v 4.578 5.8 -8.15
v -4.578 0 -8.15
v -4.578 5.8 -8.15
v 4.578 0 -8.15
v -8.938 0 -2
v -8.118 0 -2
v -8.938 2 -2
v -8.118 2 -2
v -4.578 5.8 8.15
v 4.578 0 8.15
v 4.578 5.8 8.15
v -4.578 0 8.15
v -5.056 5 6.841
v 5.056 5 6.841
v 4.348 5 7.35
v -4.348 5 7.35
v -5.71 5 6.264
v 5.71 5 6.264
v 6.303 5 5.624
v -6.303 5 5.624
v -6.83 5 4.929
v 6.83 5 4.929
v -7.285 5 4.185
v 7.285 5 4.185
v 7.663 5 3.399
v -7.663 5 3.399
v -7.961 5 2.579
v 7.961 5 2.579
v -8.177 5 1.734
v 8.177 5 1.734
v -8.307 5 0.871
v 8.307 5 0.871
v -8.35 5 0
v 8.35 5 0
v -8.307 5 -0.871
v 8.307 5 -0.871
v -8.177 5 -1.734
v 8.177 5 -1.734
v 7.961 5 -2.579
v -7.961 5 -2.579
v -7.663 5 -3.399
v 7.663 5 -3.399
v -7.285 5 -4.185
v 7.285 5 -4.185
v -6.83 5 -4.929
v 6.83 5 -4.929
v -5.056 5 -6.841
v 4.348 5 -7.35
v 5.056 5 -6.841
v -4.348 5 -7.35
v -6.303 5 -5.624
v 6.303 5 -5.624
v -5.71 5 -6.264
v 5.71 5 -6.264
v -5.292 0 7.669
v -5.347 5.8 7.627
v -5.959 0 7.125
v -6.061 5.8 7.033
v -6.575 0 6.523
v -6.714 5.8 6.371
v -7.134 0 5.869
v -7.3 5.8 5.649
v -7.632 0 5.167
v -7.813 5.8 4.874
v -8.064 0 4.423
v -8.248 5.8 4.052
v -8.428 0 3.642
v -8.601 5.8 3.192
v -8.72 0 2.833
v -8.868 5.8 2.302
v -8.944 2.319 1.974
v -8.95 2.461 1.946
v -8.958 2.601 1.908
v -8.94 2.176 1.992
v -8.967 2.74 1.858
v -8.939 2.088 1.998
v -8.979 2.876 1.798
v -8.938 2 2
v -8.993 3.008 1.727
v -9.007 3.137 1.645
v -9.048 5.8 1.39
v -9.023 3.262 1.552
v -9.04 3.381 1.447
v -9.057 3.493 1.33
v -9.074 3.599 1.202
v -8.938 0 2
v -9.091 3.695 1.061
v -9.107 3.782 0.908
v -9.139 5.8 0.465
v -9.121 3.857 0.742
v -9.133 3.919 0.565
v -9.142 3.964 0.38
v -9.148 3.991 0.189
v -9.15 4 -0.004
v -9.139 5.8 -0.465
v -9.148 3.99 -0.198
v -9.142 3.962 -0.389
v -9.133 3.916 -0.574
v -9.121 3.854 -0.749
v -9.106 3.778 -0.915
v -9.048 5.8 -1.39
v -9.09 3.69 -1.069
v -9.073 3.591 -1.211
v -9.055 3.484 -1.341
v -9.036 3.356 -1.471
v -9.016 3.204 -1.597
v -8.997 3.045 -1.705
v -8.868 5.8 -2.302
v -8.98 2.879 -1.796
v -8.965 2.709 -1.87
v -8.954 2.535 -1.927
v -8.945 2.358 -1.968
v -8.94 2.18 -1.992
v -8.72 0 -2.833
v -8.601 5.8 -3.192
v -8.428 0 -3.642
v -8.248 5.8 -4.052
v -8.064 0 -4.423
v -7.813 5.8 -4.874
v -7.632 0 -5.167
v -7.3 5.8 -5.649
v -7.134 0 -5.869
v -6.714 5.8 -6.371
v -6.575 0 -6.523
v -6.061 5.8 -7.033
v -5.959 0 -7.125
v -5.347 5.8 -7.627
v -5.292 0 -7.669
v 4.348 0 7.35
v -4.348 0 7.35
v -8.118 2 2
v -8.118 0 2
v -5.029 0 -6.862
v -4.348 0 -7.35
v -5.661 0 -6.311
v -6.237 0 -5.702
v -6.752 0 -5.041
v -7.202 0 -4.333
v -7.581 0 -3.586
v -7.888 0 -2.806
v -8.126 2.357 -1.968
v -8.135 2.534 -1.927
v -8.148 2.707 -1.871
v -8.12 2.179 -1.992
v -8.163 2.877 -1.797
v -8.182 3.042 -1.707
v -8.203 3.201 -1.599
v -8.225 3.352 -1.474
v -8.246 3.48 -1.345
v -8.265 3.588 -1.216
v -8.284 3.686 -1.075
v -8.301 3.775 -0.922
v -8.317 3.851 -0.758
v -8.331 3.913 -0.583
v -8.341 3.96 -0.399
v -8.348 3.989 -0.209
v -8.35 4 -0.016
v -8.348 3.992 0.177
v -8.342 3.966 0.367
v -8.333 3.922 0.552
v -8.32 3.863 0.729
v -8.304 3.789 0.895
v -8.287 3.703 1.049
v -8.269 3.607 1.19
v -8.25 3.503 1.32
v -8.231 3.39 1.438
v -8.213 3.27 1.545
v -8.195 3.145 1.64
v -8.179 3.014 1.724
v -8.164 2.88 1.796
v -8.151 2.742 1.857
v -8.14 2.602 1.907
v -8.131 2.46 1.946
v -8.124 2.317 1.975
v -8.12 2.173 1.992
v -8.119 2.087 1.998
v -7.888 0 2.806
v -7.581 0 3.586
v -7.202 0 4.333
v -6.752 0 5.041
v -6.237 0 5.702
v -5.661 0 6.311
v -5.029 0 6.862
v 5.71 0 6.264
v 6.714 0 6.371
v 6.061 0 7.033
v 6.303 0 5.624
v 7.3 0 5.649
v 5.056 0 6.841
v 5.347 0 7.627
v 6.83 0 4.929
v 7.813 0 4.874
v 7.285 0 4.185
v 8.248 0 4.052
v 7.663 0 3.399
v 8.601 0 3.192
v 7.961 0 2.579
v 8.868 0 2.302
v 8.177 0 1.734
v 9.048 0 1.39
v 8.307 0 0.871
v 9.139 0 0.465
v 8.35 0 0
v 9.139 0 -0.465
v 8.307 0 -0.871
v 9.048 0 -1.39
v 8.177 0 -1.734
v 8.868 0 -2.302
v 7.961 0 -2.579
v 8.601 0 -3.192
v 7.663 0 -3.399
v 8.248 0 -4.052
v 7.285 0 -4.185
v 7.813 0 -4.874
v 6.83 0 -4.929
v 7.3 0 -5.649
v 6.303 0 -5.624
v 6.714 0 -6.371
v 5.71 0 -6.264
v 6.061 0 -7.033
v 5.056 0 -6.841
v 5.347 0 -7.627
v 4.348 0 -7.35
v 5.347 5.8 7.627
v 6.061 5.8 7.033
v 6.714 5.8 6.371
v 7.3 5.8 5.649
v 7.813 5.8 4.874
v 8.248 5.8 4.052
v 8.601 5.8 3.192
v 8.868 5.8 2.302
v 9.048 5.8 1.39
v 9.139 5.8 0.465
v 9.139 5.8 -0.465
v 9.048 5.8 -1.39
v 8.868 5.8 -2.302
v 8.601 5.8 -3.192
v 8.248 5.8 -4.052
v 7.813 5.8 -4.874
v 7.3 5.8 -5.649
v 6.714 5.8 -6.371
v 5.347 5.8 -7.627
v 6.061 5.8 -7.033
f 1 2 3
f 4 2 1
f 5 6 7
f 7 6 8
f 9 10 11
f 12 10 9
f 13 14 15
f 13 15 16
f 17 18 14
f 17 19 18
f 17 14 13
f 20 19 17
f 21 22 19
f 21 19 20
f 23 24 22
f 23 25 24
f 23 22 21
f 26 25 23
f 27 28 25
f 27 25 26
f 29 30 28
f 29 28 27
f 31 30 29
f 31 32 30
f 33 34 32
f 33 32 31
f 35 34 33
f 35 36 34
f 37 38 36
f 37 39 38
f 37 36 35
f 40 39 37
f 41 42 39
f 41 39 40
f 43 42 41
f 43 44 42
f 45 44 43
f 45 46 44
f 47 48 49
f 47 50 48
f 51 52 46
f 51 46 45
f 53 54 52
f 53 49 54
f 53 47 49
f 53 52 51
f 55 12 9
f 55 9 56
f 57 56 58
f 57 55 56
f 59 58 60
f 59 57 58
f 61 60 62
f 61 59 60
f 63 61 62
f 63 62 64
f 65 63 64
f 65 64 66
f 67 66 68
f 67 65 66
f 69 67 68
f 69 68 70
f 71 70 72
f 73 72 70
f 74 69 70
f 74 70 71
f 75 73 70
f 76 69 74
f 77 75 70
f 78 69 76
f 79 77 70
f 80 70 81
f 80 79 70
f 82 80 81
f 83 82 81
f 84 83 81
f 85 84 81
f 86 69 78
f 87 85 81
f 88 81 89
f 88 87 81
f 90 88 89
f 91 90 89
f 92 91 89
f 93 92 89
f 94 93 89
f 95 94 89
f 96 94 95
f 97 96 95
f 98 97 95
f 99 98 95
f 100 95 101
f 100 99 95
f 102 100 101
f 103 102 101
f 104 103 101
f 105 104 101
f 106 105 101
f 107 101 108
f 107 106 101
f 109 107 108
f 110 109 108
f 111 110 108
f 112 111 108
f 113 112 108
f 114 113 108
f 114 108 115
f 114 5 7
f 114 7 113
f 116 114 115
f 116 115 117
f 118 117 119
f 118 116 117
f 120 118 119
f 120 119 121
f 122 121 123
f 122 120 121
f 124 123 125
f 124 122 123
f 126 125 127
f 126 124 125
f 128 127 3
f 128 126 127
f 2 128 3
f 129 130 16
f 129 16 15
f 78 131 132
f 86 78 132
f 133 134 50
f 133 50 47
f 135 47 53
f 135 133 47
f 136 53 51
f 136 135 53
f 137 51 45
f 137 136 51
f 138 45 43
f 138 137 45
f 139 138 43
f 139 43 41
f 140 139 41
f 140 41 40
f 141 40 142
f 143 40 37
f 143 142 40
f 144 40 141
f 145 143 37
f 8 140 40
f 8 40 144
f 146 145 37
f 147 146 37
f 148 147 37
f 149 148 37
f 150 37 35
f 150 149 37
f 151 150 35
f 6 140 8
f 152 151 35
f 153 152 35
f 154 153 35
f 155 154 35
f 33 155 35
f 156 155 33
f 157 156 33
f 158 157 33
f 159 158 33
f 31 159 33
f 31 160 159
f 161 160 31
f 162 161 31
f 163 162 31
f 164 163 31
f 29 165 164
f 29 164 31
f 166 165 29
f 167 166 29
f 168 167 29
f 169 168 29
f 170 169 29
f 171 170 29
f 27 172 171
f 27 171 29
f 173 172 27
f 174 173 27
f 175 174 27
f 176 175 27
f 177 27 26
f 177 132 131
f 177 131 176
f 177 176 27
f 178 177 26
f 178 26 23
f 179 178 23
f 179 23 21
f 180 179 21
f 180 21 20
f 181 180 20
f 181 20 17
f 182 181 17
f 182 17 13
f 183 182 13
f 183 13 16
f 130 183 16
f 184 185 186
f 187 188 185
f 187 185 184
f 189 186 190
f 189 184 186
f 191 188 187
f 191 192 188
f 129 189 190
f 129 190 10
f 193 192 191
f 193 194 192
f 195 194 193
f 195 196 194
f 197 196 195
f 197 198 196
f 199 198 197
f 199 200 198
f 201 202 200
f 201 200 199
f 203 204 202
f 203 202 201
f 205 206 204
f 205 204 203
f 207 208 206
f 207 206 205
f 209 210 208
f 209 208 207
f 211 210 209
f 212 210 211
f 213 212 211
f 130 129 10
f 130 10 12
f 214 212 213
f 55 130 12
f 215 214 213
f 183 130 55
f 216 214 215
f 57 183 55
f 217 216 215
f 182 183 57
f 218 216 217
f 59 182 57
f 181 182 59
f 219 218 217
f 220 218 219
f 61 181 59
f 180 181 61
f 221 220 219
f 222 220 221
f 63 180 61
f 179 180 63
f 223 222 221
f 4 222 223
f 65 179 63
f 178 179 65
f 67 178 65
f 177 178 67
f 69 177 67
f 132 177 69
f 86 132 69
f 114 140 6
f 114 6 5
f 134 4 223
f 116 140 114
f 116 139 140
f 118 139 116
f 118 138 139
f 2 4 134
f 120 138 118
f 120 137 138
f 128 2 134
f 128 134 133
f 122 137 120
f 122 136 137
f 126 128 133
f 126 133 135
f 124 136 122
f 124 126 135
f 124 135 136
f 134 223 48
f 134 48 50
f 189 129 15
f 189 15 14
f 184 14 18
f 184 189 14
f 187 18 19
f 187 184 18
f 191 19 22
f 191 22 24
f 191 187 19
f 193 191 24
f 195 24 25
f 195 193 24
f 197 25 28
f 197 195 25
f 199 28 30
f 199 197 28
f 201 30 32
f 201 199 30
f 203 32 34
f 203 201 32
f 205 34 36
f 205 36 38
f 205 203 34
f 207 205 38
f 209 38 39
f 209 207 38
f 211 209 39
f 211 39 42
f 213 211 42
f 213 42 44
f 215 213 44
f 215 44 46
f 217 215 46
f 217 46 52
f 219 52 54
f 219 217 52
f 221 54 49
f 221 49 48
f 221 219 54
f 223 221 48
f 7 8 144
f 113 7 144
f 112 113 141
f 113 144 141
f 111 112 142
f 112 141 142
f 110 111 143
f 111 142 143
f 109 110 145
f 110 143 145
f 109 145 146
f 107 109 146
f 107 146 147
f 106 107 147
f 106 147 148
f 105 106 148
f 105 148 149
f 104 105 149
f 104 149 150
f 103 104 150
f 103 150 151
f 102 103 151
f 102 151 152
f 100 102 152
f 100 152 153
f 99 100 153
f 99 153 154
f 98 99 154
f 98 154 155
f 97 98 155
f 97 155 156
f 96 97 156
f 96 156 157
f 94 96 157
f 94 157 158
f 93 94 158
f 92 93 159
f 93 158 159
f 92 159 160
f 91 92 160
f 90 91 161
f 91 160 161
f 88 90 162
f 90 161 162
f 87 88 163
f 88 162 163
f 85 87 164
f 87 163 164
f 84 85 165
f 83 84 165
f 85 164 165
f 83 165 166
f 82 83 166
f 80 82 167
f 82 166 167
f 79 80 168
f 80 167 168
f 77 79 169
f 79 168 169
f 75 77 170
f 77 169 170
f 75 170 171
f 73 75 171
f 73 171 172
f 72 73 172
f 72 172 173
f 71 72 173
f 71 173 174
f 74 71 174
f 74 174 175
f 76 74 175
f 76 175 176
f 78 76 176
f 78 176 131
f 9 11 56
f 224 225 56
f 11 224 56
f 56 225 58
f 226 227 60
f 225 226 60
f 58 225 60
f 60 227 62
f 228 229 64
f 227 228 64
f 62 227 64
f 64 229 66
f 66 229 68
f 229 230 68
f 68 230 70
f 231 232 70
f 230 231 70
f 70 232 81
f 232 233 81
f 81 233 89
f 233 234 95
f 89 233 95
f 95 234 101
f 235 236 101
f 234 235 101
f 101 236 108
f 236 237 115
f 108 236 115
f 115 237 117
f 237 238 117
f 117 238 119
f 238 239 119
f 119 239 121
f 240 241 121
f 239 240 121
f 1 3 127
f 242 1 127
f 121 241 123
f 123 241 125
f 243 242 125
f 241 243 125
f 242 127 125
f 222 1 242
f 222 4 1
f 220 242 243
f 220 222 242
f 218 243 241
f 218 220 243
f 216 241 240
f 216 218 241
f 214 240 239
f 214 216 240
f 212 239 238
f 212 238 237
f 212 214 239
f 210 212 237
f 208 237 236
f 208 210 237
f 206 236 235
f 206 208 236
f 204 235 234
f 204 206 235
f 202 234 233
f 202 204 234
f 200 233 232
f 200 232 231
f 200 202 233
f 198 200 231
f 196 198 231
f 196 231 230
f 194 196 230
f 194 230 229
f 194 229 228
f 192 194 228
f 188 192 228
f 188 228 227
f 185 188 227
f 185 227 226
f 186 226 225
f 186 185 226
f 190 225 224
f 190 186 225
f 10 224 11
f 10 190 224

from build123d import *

# Parameters (mm, degrees)
BOSS_EXTRUDE1_DEPTH = 5
BOSS_EXTRUDE2_DEPTH = 0.8
CUT_EXTRUDE1_DEPTH  = 14.556732645


with BuildPart() as part:
    # Sketch1 → Boss-Extrude1 (new body)
    with BuildSketch(Plane(origin=(0, 0, 0), x_dir=(1, 0, 0), z_dir=(0, 1, 0))):
        with BuildLine():
            ThreePointArc((4.577951386, 8.15), (9.15, 0), (4.577951386, -8.15))
            Line((4.577951386, -8.15), (-4.577951386, -8.15))
            ThreePointArc((-4.577951386, -8.15), (-9.15, 0), (-4.577951386, 8.15))
            Line((-4.577951386, 8.15), (4.577951386, 8.15))
        make_face()
        with BuildLine():
            Line((4.347630988, 7.35), (-4.347630988, 7.35))
            ThreePointArc((-4.347630988, 7.35), (-8.35, 0), (-4.347630988, -7.35))
            Line((-4.347630988, -7.35), (4.347630988, -7.35))
            ThreePointArc((4.347630988, -7.35), (8.35, 0), (4.347630988, 7.35))
        make_face(mode=Mode.SUBTRACT)
    extrude(amount=BOSS_EXTRUDE1_DEPTH)

    # Sketch2 → Boss-Extrude2 (add)
    with BuildSketch(Plane(origin=(0, 5, 0), x_dir=(1, 0, 0), z_dir=(0, 1, 0))):
        with BuildLine():
            Line((4.577951386, -8.15), (-4.577951386, -8.15))
            ThreePointArc((-4.577951386, -8.15), (-9.15, 0), (-4.577951386, 8.15))
            Line((-4.577951386, 8.15), (4.577951386, 8.15))
            ThreePointArc((4.577951386, 8.15), (9.15, 0), (4.577951386, -8.15))
        make_face()
    extrude(amount=BOSS_EXTRUDE2_DEPTH)

    # Sketch3 → Cut-Extrude1 (cut, through all)
    with BuildSketch(Plane(origin=(0, 0, 0), x_dir=(0, 0, -1), z_dir=(1, 0, 0))):
        with BuildLine():
            Line((-2, 2), (-2, 0))
            Line((-2, 0), (2, 0))
            Line((2, 0), (2, 2))
            ThreePointArc((2, 2), (0, 4), (-2, 2))
        make_face()
    extrude(amount=-CUT_EXTRUDE1_DEPTH, mode=Mode.SUBTRACT)


solid = part.part
